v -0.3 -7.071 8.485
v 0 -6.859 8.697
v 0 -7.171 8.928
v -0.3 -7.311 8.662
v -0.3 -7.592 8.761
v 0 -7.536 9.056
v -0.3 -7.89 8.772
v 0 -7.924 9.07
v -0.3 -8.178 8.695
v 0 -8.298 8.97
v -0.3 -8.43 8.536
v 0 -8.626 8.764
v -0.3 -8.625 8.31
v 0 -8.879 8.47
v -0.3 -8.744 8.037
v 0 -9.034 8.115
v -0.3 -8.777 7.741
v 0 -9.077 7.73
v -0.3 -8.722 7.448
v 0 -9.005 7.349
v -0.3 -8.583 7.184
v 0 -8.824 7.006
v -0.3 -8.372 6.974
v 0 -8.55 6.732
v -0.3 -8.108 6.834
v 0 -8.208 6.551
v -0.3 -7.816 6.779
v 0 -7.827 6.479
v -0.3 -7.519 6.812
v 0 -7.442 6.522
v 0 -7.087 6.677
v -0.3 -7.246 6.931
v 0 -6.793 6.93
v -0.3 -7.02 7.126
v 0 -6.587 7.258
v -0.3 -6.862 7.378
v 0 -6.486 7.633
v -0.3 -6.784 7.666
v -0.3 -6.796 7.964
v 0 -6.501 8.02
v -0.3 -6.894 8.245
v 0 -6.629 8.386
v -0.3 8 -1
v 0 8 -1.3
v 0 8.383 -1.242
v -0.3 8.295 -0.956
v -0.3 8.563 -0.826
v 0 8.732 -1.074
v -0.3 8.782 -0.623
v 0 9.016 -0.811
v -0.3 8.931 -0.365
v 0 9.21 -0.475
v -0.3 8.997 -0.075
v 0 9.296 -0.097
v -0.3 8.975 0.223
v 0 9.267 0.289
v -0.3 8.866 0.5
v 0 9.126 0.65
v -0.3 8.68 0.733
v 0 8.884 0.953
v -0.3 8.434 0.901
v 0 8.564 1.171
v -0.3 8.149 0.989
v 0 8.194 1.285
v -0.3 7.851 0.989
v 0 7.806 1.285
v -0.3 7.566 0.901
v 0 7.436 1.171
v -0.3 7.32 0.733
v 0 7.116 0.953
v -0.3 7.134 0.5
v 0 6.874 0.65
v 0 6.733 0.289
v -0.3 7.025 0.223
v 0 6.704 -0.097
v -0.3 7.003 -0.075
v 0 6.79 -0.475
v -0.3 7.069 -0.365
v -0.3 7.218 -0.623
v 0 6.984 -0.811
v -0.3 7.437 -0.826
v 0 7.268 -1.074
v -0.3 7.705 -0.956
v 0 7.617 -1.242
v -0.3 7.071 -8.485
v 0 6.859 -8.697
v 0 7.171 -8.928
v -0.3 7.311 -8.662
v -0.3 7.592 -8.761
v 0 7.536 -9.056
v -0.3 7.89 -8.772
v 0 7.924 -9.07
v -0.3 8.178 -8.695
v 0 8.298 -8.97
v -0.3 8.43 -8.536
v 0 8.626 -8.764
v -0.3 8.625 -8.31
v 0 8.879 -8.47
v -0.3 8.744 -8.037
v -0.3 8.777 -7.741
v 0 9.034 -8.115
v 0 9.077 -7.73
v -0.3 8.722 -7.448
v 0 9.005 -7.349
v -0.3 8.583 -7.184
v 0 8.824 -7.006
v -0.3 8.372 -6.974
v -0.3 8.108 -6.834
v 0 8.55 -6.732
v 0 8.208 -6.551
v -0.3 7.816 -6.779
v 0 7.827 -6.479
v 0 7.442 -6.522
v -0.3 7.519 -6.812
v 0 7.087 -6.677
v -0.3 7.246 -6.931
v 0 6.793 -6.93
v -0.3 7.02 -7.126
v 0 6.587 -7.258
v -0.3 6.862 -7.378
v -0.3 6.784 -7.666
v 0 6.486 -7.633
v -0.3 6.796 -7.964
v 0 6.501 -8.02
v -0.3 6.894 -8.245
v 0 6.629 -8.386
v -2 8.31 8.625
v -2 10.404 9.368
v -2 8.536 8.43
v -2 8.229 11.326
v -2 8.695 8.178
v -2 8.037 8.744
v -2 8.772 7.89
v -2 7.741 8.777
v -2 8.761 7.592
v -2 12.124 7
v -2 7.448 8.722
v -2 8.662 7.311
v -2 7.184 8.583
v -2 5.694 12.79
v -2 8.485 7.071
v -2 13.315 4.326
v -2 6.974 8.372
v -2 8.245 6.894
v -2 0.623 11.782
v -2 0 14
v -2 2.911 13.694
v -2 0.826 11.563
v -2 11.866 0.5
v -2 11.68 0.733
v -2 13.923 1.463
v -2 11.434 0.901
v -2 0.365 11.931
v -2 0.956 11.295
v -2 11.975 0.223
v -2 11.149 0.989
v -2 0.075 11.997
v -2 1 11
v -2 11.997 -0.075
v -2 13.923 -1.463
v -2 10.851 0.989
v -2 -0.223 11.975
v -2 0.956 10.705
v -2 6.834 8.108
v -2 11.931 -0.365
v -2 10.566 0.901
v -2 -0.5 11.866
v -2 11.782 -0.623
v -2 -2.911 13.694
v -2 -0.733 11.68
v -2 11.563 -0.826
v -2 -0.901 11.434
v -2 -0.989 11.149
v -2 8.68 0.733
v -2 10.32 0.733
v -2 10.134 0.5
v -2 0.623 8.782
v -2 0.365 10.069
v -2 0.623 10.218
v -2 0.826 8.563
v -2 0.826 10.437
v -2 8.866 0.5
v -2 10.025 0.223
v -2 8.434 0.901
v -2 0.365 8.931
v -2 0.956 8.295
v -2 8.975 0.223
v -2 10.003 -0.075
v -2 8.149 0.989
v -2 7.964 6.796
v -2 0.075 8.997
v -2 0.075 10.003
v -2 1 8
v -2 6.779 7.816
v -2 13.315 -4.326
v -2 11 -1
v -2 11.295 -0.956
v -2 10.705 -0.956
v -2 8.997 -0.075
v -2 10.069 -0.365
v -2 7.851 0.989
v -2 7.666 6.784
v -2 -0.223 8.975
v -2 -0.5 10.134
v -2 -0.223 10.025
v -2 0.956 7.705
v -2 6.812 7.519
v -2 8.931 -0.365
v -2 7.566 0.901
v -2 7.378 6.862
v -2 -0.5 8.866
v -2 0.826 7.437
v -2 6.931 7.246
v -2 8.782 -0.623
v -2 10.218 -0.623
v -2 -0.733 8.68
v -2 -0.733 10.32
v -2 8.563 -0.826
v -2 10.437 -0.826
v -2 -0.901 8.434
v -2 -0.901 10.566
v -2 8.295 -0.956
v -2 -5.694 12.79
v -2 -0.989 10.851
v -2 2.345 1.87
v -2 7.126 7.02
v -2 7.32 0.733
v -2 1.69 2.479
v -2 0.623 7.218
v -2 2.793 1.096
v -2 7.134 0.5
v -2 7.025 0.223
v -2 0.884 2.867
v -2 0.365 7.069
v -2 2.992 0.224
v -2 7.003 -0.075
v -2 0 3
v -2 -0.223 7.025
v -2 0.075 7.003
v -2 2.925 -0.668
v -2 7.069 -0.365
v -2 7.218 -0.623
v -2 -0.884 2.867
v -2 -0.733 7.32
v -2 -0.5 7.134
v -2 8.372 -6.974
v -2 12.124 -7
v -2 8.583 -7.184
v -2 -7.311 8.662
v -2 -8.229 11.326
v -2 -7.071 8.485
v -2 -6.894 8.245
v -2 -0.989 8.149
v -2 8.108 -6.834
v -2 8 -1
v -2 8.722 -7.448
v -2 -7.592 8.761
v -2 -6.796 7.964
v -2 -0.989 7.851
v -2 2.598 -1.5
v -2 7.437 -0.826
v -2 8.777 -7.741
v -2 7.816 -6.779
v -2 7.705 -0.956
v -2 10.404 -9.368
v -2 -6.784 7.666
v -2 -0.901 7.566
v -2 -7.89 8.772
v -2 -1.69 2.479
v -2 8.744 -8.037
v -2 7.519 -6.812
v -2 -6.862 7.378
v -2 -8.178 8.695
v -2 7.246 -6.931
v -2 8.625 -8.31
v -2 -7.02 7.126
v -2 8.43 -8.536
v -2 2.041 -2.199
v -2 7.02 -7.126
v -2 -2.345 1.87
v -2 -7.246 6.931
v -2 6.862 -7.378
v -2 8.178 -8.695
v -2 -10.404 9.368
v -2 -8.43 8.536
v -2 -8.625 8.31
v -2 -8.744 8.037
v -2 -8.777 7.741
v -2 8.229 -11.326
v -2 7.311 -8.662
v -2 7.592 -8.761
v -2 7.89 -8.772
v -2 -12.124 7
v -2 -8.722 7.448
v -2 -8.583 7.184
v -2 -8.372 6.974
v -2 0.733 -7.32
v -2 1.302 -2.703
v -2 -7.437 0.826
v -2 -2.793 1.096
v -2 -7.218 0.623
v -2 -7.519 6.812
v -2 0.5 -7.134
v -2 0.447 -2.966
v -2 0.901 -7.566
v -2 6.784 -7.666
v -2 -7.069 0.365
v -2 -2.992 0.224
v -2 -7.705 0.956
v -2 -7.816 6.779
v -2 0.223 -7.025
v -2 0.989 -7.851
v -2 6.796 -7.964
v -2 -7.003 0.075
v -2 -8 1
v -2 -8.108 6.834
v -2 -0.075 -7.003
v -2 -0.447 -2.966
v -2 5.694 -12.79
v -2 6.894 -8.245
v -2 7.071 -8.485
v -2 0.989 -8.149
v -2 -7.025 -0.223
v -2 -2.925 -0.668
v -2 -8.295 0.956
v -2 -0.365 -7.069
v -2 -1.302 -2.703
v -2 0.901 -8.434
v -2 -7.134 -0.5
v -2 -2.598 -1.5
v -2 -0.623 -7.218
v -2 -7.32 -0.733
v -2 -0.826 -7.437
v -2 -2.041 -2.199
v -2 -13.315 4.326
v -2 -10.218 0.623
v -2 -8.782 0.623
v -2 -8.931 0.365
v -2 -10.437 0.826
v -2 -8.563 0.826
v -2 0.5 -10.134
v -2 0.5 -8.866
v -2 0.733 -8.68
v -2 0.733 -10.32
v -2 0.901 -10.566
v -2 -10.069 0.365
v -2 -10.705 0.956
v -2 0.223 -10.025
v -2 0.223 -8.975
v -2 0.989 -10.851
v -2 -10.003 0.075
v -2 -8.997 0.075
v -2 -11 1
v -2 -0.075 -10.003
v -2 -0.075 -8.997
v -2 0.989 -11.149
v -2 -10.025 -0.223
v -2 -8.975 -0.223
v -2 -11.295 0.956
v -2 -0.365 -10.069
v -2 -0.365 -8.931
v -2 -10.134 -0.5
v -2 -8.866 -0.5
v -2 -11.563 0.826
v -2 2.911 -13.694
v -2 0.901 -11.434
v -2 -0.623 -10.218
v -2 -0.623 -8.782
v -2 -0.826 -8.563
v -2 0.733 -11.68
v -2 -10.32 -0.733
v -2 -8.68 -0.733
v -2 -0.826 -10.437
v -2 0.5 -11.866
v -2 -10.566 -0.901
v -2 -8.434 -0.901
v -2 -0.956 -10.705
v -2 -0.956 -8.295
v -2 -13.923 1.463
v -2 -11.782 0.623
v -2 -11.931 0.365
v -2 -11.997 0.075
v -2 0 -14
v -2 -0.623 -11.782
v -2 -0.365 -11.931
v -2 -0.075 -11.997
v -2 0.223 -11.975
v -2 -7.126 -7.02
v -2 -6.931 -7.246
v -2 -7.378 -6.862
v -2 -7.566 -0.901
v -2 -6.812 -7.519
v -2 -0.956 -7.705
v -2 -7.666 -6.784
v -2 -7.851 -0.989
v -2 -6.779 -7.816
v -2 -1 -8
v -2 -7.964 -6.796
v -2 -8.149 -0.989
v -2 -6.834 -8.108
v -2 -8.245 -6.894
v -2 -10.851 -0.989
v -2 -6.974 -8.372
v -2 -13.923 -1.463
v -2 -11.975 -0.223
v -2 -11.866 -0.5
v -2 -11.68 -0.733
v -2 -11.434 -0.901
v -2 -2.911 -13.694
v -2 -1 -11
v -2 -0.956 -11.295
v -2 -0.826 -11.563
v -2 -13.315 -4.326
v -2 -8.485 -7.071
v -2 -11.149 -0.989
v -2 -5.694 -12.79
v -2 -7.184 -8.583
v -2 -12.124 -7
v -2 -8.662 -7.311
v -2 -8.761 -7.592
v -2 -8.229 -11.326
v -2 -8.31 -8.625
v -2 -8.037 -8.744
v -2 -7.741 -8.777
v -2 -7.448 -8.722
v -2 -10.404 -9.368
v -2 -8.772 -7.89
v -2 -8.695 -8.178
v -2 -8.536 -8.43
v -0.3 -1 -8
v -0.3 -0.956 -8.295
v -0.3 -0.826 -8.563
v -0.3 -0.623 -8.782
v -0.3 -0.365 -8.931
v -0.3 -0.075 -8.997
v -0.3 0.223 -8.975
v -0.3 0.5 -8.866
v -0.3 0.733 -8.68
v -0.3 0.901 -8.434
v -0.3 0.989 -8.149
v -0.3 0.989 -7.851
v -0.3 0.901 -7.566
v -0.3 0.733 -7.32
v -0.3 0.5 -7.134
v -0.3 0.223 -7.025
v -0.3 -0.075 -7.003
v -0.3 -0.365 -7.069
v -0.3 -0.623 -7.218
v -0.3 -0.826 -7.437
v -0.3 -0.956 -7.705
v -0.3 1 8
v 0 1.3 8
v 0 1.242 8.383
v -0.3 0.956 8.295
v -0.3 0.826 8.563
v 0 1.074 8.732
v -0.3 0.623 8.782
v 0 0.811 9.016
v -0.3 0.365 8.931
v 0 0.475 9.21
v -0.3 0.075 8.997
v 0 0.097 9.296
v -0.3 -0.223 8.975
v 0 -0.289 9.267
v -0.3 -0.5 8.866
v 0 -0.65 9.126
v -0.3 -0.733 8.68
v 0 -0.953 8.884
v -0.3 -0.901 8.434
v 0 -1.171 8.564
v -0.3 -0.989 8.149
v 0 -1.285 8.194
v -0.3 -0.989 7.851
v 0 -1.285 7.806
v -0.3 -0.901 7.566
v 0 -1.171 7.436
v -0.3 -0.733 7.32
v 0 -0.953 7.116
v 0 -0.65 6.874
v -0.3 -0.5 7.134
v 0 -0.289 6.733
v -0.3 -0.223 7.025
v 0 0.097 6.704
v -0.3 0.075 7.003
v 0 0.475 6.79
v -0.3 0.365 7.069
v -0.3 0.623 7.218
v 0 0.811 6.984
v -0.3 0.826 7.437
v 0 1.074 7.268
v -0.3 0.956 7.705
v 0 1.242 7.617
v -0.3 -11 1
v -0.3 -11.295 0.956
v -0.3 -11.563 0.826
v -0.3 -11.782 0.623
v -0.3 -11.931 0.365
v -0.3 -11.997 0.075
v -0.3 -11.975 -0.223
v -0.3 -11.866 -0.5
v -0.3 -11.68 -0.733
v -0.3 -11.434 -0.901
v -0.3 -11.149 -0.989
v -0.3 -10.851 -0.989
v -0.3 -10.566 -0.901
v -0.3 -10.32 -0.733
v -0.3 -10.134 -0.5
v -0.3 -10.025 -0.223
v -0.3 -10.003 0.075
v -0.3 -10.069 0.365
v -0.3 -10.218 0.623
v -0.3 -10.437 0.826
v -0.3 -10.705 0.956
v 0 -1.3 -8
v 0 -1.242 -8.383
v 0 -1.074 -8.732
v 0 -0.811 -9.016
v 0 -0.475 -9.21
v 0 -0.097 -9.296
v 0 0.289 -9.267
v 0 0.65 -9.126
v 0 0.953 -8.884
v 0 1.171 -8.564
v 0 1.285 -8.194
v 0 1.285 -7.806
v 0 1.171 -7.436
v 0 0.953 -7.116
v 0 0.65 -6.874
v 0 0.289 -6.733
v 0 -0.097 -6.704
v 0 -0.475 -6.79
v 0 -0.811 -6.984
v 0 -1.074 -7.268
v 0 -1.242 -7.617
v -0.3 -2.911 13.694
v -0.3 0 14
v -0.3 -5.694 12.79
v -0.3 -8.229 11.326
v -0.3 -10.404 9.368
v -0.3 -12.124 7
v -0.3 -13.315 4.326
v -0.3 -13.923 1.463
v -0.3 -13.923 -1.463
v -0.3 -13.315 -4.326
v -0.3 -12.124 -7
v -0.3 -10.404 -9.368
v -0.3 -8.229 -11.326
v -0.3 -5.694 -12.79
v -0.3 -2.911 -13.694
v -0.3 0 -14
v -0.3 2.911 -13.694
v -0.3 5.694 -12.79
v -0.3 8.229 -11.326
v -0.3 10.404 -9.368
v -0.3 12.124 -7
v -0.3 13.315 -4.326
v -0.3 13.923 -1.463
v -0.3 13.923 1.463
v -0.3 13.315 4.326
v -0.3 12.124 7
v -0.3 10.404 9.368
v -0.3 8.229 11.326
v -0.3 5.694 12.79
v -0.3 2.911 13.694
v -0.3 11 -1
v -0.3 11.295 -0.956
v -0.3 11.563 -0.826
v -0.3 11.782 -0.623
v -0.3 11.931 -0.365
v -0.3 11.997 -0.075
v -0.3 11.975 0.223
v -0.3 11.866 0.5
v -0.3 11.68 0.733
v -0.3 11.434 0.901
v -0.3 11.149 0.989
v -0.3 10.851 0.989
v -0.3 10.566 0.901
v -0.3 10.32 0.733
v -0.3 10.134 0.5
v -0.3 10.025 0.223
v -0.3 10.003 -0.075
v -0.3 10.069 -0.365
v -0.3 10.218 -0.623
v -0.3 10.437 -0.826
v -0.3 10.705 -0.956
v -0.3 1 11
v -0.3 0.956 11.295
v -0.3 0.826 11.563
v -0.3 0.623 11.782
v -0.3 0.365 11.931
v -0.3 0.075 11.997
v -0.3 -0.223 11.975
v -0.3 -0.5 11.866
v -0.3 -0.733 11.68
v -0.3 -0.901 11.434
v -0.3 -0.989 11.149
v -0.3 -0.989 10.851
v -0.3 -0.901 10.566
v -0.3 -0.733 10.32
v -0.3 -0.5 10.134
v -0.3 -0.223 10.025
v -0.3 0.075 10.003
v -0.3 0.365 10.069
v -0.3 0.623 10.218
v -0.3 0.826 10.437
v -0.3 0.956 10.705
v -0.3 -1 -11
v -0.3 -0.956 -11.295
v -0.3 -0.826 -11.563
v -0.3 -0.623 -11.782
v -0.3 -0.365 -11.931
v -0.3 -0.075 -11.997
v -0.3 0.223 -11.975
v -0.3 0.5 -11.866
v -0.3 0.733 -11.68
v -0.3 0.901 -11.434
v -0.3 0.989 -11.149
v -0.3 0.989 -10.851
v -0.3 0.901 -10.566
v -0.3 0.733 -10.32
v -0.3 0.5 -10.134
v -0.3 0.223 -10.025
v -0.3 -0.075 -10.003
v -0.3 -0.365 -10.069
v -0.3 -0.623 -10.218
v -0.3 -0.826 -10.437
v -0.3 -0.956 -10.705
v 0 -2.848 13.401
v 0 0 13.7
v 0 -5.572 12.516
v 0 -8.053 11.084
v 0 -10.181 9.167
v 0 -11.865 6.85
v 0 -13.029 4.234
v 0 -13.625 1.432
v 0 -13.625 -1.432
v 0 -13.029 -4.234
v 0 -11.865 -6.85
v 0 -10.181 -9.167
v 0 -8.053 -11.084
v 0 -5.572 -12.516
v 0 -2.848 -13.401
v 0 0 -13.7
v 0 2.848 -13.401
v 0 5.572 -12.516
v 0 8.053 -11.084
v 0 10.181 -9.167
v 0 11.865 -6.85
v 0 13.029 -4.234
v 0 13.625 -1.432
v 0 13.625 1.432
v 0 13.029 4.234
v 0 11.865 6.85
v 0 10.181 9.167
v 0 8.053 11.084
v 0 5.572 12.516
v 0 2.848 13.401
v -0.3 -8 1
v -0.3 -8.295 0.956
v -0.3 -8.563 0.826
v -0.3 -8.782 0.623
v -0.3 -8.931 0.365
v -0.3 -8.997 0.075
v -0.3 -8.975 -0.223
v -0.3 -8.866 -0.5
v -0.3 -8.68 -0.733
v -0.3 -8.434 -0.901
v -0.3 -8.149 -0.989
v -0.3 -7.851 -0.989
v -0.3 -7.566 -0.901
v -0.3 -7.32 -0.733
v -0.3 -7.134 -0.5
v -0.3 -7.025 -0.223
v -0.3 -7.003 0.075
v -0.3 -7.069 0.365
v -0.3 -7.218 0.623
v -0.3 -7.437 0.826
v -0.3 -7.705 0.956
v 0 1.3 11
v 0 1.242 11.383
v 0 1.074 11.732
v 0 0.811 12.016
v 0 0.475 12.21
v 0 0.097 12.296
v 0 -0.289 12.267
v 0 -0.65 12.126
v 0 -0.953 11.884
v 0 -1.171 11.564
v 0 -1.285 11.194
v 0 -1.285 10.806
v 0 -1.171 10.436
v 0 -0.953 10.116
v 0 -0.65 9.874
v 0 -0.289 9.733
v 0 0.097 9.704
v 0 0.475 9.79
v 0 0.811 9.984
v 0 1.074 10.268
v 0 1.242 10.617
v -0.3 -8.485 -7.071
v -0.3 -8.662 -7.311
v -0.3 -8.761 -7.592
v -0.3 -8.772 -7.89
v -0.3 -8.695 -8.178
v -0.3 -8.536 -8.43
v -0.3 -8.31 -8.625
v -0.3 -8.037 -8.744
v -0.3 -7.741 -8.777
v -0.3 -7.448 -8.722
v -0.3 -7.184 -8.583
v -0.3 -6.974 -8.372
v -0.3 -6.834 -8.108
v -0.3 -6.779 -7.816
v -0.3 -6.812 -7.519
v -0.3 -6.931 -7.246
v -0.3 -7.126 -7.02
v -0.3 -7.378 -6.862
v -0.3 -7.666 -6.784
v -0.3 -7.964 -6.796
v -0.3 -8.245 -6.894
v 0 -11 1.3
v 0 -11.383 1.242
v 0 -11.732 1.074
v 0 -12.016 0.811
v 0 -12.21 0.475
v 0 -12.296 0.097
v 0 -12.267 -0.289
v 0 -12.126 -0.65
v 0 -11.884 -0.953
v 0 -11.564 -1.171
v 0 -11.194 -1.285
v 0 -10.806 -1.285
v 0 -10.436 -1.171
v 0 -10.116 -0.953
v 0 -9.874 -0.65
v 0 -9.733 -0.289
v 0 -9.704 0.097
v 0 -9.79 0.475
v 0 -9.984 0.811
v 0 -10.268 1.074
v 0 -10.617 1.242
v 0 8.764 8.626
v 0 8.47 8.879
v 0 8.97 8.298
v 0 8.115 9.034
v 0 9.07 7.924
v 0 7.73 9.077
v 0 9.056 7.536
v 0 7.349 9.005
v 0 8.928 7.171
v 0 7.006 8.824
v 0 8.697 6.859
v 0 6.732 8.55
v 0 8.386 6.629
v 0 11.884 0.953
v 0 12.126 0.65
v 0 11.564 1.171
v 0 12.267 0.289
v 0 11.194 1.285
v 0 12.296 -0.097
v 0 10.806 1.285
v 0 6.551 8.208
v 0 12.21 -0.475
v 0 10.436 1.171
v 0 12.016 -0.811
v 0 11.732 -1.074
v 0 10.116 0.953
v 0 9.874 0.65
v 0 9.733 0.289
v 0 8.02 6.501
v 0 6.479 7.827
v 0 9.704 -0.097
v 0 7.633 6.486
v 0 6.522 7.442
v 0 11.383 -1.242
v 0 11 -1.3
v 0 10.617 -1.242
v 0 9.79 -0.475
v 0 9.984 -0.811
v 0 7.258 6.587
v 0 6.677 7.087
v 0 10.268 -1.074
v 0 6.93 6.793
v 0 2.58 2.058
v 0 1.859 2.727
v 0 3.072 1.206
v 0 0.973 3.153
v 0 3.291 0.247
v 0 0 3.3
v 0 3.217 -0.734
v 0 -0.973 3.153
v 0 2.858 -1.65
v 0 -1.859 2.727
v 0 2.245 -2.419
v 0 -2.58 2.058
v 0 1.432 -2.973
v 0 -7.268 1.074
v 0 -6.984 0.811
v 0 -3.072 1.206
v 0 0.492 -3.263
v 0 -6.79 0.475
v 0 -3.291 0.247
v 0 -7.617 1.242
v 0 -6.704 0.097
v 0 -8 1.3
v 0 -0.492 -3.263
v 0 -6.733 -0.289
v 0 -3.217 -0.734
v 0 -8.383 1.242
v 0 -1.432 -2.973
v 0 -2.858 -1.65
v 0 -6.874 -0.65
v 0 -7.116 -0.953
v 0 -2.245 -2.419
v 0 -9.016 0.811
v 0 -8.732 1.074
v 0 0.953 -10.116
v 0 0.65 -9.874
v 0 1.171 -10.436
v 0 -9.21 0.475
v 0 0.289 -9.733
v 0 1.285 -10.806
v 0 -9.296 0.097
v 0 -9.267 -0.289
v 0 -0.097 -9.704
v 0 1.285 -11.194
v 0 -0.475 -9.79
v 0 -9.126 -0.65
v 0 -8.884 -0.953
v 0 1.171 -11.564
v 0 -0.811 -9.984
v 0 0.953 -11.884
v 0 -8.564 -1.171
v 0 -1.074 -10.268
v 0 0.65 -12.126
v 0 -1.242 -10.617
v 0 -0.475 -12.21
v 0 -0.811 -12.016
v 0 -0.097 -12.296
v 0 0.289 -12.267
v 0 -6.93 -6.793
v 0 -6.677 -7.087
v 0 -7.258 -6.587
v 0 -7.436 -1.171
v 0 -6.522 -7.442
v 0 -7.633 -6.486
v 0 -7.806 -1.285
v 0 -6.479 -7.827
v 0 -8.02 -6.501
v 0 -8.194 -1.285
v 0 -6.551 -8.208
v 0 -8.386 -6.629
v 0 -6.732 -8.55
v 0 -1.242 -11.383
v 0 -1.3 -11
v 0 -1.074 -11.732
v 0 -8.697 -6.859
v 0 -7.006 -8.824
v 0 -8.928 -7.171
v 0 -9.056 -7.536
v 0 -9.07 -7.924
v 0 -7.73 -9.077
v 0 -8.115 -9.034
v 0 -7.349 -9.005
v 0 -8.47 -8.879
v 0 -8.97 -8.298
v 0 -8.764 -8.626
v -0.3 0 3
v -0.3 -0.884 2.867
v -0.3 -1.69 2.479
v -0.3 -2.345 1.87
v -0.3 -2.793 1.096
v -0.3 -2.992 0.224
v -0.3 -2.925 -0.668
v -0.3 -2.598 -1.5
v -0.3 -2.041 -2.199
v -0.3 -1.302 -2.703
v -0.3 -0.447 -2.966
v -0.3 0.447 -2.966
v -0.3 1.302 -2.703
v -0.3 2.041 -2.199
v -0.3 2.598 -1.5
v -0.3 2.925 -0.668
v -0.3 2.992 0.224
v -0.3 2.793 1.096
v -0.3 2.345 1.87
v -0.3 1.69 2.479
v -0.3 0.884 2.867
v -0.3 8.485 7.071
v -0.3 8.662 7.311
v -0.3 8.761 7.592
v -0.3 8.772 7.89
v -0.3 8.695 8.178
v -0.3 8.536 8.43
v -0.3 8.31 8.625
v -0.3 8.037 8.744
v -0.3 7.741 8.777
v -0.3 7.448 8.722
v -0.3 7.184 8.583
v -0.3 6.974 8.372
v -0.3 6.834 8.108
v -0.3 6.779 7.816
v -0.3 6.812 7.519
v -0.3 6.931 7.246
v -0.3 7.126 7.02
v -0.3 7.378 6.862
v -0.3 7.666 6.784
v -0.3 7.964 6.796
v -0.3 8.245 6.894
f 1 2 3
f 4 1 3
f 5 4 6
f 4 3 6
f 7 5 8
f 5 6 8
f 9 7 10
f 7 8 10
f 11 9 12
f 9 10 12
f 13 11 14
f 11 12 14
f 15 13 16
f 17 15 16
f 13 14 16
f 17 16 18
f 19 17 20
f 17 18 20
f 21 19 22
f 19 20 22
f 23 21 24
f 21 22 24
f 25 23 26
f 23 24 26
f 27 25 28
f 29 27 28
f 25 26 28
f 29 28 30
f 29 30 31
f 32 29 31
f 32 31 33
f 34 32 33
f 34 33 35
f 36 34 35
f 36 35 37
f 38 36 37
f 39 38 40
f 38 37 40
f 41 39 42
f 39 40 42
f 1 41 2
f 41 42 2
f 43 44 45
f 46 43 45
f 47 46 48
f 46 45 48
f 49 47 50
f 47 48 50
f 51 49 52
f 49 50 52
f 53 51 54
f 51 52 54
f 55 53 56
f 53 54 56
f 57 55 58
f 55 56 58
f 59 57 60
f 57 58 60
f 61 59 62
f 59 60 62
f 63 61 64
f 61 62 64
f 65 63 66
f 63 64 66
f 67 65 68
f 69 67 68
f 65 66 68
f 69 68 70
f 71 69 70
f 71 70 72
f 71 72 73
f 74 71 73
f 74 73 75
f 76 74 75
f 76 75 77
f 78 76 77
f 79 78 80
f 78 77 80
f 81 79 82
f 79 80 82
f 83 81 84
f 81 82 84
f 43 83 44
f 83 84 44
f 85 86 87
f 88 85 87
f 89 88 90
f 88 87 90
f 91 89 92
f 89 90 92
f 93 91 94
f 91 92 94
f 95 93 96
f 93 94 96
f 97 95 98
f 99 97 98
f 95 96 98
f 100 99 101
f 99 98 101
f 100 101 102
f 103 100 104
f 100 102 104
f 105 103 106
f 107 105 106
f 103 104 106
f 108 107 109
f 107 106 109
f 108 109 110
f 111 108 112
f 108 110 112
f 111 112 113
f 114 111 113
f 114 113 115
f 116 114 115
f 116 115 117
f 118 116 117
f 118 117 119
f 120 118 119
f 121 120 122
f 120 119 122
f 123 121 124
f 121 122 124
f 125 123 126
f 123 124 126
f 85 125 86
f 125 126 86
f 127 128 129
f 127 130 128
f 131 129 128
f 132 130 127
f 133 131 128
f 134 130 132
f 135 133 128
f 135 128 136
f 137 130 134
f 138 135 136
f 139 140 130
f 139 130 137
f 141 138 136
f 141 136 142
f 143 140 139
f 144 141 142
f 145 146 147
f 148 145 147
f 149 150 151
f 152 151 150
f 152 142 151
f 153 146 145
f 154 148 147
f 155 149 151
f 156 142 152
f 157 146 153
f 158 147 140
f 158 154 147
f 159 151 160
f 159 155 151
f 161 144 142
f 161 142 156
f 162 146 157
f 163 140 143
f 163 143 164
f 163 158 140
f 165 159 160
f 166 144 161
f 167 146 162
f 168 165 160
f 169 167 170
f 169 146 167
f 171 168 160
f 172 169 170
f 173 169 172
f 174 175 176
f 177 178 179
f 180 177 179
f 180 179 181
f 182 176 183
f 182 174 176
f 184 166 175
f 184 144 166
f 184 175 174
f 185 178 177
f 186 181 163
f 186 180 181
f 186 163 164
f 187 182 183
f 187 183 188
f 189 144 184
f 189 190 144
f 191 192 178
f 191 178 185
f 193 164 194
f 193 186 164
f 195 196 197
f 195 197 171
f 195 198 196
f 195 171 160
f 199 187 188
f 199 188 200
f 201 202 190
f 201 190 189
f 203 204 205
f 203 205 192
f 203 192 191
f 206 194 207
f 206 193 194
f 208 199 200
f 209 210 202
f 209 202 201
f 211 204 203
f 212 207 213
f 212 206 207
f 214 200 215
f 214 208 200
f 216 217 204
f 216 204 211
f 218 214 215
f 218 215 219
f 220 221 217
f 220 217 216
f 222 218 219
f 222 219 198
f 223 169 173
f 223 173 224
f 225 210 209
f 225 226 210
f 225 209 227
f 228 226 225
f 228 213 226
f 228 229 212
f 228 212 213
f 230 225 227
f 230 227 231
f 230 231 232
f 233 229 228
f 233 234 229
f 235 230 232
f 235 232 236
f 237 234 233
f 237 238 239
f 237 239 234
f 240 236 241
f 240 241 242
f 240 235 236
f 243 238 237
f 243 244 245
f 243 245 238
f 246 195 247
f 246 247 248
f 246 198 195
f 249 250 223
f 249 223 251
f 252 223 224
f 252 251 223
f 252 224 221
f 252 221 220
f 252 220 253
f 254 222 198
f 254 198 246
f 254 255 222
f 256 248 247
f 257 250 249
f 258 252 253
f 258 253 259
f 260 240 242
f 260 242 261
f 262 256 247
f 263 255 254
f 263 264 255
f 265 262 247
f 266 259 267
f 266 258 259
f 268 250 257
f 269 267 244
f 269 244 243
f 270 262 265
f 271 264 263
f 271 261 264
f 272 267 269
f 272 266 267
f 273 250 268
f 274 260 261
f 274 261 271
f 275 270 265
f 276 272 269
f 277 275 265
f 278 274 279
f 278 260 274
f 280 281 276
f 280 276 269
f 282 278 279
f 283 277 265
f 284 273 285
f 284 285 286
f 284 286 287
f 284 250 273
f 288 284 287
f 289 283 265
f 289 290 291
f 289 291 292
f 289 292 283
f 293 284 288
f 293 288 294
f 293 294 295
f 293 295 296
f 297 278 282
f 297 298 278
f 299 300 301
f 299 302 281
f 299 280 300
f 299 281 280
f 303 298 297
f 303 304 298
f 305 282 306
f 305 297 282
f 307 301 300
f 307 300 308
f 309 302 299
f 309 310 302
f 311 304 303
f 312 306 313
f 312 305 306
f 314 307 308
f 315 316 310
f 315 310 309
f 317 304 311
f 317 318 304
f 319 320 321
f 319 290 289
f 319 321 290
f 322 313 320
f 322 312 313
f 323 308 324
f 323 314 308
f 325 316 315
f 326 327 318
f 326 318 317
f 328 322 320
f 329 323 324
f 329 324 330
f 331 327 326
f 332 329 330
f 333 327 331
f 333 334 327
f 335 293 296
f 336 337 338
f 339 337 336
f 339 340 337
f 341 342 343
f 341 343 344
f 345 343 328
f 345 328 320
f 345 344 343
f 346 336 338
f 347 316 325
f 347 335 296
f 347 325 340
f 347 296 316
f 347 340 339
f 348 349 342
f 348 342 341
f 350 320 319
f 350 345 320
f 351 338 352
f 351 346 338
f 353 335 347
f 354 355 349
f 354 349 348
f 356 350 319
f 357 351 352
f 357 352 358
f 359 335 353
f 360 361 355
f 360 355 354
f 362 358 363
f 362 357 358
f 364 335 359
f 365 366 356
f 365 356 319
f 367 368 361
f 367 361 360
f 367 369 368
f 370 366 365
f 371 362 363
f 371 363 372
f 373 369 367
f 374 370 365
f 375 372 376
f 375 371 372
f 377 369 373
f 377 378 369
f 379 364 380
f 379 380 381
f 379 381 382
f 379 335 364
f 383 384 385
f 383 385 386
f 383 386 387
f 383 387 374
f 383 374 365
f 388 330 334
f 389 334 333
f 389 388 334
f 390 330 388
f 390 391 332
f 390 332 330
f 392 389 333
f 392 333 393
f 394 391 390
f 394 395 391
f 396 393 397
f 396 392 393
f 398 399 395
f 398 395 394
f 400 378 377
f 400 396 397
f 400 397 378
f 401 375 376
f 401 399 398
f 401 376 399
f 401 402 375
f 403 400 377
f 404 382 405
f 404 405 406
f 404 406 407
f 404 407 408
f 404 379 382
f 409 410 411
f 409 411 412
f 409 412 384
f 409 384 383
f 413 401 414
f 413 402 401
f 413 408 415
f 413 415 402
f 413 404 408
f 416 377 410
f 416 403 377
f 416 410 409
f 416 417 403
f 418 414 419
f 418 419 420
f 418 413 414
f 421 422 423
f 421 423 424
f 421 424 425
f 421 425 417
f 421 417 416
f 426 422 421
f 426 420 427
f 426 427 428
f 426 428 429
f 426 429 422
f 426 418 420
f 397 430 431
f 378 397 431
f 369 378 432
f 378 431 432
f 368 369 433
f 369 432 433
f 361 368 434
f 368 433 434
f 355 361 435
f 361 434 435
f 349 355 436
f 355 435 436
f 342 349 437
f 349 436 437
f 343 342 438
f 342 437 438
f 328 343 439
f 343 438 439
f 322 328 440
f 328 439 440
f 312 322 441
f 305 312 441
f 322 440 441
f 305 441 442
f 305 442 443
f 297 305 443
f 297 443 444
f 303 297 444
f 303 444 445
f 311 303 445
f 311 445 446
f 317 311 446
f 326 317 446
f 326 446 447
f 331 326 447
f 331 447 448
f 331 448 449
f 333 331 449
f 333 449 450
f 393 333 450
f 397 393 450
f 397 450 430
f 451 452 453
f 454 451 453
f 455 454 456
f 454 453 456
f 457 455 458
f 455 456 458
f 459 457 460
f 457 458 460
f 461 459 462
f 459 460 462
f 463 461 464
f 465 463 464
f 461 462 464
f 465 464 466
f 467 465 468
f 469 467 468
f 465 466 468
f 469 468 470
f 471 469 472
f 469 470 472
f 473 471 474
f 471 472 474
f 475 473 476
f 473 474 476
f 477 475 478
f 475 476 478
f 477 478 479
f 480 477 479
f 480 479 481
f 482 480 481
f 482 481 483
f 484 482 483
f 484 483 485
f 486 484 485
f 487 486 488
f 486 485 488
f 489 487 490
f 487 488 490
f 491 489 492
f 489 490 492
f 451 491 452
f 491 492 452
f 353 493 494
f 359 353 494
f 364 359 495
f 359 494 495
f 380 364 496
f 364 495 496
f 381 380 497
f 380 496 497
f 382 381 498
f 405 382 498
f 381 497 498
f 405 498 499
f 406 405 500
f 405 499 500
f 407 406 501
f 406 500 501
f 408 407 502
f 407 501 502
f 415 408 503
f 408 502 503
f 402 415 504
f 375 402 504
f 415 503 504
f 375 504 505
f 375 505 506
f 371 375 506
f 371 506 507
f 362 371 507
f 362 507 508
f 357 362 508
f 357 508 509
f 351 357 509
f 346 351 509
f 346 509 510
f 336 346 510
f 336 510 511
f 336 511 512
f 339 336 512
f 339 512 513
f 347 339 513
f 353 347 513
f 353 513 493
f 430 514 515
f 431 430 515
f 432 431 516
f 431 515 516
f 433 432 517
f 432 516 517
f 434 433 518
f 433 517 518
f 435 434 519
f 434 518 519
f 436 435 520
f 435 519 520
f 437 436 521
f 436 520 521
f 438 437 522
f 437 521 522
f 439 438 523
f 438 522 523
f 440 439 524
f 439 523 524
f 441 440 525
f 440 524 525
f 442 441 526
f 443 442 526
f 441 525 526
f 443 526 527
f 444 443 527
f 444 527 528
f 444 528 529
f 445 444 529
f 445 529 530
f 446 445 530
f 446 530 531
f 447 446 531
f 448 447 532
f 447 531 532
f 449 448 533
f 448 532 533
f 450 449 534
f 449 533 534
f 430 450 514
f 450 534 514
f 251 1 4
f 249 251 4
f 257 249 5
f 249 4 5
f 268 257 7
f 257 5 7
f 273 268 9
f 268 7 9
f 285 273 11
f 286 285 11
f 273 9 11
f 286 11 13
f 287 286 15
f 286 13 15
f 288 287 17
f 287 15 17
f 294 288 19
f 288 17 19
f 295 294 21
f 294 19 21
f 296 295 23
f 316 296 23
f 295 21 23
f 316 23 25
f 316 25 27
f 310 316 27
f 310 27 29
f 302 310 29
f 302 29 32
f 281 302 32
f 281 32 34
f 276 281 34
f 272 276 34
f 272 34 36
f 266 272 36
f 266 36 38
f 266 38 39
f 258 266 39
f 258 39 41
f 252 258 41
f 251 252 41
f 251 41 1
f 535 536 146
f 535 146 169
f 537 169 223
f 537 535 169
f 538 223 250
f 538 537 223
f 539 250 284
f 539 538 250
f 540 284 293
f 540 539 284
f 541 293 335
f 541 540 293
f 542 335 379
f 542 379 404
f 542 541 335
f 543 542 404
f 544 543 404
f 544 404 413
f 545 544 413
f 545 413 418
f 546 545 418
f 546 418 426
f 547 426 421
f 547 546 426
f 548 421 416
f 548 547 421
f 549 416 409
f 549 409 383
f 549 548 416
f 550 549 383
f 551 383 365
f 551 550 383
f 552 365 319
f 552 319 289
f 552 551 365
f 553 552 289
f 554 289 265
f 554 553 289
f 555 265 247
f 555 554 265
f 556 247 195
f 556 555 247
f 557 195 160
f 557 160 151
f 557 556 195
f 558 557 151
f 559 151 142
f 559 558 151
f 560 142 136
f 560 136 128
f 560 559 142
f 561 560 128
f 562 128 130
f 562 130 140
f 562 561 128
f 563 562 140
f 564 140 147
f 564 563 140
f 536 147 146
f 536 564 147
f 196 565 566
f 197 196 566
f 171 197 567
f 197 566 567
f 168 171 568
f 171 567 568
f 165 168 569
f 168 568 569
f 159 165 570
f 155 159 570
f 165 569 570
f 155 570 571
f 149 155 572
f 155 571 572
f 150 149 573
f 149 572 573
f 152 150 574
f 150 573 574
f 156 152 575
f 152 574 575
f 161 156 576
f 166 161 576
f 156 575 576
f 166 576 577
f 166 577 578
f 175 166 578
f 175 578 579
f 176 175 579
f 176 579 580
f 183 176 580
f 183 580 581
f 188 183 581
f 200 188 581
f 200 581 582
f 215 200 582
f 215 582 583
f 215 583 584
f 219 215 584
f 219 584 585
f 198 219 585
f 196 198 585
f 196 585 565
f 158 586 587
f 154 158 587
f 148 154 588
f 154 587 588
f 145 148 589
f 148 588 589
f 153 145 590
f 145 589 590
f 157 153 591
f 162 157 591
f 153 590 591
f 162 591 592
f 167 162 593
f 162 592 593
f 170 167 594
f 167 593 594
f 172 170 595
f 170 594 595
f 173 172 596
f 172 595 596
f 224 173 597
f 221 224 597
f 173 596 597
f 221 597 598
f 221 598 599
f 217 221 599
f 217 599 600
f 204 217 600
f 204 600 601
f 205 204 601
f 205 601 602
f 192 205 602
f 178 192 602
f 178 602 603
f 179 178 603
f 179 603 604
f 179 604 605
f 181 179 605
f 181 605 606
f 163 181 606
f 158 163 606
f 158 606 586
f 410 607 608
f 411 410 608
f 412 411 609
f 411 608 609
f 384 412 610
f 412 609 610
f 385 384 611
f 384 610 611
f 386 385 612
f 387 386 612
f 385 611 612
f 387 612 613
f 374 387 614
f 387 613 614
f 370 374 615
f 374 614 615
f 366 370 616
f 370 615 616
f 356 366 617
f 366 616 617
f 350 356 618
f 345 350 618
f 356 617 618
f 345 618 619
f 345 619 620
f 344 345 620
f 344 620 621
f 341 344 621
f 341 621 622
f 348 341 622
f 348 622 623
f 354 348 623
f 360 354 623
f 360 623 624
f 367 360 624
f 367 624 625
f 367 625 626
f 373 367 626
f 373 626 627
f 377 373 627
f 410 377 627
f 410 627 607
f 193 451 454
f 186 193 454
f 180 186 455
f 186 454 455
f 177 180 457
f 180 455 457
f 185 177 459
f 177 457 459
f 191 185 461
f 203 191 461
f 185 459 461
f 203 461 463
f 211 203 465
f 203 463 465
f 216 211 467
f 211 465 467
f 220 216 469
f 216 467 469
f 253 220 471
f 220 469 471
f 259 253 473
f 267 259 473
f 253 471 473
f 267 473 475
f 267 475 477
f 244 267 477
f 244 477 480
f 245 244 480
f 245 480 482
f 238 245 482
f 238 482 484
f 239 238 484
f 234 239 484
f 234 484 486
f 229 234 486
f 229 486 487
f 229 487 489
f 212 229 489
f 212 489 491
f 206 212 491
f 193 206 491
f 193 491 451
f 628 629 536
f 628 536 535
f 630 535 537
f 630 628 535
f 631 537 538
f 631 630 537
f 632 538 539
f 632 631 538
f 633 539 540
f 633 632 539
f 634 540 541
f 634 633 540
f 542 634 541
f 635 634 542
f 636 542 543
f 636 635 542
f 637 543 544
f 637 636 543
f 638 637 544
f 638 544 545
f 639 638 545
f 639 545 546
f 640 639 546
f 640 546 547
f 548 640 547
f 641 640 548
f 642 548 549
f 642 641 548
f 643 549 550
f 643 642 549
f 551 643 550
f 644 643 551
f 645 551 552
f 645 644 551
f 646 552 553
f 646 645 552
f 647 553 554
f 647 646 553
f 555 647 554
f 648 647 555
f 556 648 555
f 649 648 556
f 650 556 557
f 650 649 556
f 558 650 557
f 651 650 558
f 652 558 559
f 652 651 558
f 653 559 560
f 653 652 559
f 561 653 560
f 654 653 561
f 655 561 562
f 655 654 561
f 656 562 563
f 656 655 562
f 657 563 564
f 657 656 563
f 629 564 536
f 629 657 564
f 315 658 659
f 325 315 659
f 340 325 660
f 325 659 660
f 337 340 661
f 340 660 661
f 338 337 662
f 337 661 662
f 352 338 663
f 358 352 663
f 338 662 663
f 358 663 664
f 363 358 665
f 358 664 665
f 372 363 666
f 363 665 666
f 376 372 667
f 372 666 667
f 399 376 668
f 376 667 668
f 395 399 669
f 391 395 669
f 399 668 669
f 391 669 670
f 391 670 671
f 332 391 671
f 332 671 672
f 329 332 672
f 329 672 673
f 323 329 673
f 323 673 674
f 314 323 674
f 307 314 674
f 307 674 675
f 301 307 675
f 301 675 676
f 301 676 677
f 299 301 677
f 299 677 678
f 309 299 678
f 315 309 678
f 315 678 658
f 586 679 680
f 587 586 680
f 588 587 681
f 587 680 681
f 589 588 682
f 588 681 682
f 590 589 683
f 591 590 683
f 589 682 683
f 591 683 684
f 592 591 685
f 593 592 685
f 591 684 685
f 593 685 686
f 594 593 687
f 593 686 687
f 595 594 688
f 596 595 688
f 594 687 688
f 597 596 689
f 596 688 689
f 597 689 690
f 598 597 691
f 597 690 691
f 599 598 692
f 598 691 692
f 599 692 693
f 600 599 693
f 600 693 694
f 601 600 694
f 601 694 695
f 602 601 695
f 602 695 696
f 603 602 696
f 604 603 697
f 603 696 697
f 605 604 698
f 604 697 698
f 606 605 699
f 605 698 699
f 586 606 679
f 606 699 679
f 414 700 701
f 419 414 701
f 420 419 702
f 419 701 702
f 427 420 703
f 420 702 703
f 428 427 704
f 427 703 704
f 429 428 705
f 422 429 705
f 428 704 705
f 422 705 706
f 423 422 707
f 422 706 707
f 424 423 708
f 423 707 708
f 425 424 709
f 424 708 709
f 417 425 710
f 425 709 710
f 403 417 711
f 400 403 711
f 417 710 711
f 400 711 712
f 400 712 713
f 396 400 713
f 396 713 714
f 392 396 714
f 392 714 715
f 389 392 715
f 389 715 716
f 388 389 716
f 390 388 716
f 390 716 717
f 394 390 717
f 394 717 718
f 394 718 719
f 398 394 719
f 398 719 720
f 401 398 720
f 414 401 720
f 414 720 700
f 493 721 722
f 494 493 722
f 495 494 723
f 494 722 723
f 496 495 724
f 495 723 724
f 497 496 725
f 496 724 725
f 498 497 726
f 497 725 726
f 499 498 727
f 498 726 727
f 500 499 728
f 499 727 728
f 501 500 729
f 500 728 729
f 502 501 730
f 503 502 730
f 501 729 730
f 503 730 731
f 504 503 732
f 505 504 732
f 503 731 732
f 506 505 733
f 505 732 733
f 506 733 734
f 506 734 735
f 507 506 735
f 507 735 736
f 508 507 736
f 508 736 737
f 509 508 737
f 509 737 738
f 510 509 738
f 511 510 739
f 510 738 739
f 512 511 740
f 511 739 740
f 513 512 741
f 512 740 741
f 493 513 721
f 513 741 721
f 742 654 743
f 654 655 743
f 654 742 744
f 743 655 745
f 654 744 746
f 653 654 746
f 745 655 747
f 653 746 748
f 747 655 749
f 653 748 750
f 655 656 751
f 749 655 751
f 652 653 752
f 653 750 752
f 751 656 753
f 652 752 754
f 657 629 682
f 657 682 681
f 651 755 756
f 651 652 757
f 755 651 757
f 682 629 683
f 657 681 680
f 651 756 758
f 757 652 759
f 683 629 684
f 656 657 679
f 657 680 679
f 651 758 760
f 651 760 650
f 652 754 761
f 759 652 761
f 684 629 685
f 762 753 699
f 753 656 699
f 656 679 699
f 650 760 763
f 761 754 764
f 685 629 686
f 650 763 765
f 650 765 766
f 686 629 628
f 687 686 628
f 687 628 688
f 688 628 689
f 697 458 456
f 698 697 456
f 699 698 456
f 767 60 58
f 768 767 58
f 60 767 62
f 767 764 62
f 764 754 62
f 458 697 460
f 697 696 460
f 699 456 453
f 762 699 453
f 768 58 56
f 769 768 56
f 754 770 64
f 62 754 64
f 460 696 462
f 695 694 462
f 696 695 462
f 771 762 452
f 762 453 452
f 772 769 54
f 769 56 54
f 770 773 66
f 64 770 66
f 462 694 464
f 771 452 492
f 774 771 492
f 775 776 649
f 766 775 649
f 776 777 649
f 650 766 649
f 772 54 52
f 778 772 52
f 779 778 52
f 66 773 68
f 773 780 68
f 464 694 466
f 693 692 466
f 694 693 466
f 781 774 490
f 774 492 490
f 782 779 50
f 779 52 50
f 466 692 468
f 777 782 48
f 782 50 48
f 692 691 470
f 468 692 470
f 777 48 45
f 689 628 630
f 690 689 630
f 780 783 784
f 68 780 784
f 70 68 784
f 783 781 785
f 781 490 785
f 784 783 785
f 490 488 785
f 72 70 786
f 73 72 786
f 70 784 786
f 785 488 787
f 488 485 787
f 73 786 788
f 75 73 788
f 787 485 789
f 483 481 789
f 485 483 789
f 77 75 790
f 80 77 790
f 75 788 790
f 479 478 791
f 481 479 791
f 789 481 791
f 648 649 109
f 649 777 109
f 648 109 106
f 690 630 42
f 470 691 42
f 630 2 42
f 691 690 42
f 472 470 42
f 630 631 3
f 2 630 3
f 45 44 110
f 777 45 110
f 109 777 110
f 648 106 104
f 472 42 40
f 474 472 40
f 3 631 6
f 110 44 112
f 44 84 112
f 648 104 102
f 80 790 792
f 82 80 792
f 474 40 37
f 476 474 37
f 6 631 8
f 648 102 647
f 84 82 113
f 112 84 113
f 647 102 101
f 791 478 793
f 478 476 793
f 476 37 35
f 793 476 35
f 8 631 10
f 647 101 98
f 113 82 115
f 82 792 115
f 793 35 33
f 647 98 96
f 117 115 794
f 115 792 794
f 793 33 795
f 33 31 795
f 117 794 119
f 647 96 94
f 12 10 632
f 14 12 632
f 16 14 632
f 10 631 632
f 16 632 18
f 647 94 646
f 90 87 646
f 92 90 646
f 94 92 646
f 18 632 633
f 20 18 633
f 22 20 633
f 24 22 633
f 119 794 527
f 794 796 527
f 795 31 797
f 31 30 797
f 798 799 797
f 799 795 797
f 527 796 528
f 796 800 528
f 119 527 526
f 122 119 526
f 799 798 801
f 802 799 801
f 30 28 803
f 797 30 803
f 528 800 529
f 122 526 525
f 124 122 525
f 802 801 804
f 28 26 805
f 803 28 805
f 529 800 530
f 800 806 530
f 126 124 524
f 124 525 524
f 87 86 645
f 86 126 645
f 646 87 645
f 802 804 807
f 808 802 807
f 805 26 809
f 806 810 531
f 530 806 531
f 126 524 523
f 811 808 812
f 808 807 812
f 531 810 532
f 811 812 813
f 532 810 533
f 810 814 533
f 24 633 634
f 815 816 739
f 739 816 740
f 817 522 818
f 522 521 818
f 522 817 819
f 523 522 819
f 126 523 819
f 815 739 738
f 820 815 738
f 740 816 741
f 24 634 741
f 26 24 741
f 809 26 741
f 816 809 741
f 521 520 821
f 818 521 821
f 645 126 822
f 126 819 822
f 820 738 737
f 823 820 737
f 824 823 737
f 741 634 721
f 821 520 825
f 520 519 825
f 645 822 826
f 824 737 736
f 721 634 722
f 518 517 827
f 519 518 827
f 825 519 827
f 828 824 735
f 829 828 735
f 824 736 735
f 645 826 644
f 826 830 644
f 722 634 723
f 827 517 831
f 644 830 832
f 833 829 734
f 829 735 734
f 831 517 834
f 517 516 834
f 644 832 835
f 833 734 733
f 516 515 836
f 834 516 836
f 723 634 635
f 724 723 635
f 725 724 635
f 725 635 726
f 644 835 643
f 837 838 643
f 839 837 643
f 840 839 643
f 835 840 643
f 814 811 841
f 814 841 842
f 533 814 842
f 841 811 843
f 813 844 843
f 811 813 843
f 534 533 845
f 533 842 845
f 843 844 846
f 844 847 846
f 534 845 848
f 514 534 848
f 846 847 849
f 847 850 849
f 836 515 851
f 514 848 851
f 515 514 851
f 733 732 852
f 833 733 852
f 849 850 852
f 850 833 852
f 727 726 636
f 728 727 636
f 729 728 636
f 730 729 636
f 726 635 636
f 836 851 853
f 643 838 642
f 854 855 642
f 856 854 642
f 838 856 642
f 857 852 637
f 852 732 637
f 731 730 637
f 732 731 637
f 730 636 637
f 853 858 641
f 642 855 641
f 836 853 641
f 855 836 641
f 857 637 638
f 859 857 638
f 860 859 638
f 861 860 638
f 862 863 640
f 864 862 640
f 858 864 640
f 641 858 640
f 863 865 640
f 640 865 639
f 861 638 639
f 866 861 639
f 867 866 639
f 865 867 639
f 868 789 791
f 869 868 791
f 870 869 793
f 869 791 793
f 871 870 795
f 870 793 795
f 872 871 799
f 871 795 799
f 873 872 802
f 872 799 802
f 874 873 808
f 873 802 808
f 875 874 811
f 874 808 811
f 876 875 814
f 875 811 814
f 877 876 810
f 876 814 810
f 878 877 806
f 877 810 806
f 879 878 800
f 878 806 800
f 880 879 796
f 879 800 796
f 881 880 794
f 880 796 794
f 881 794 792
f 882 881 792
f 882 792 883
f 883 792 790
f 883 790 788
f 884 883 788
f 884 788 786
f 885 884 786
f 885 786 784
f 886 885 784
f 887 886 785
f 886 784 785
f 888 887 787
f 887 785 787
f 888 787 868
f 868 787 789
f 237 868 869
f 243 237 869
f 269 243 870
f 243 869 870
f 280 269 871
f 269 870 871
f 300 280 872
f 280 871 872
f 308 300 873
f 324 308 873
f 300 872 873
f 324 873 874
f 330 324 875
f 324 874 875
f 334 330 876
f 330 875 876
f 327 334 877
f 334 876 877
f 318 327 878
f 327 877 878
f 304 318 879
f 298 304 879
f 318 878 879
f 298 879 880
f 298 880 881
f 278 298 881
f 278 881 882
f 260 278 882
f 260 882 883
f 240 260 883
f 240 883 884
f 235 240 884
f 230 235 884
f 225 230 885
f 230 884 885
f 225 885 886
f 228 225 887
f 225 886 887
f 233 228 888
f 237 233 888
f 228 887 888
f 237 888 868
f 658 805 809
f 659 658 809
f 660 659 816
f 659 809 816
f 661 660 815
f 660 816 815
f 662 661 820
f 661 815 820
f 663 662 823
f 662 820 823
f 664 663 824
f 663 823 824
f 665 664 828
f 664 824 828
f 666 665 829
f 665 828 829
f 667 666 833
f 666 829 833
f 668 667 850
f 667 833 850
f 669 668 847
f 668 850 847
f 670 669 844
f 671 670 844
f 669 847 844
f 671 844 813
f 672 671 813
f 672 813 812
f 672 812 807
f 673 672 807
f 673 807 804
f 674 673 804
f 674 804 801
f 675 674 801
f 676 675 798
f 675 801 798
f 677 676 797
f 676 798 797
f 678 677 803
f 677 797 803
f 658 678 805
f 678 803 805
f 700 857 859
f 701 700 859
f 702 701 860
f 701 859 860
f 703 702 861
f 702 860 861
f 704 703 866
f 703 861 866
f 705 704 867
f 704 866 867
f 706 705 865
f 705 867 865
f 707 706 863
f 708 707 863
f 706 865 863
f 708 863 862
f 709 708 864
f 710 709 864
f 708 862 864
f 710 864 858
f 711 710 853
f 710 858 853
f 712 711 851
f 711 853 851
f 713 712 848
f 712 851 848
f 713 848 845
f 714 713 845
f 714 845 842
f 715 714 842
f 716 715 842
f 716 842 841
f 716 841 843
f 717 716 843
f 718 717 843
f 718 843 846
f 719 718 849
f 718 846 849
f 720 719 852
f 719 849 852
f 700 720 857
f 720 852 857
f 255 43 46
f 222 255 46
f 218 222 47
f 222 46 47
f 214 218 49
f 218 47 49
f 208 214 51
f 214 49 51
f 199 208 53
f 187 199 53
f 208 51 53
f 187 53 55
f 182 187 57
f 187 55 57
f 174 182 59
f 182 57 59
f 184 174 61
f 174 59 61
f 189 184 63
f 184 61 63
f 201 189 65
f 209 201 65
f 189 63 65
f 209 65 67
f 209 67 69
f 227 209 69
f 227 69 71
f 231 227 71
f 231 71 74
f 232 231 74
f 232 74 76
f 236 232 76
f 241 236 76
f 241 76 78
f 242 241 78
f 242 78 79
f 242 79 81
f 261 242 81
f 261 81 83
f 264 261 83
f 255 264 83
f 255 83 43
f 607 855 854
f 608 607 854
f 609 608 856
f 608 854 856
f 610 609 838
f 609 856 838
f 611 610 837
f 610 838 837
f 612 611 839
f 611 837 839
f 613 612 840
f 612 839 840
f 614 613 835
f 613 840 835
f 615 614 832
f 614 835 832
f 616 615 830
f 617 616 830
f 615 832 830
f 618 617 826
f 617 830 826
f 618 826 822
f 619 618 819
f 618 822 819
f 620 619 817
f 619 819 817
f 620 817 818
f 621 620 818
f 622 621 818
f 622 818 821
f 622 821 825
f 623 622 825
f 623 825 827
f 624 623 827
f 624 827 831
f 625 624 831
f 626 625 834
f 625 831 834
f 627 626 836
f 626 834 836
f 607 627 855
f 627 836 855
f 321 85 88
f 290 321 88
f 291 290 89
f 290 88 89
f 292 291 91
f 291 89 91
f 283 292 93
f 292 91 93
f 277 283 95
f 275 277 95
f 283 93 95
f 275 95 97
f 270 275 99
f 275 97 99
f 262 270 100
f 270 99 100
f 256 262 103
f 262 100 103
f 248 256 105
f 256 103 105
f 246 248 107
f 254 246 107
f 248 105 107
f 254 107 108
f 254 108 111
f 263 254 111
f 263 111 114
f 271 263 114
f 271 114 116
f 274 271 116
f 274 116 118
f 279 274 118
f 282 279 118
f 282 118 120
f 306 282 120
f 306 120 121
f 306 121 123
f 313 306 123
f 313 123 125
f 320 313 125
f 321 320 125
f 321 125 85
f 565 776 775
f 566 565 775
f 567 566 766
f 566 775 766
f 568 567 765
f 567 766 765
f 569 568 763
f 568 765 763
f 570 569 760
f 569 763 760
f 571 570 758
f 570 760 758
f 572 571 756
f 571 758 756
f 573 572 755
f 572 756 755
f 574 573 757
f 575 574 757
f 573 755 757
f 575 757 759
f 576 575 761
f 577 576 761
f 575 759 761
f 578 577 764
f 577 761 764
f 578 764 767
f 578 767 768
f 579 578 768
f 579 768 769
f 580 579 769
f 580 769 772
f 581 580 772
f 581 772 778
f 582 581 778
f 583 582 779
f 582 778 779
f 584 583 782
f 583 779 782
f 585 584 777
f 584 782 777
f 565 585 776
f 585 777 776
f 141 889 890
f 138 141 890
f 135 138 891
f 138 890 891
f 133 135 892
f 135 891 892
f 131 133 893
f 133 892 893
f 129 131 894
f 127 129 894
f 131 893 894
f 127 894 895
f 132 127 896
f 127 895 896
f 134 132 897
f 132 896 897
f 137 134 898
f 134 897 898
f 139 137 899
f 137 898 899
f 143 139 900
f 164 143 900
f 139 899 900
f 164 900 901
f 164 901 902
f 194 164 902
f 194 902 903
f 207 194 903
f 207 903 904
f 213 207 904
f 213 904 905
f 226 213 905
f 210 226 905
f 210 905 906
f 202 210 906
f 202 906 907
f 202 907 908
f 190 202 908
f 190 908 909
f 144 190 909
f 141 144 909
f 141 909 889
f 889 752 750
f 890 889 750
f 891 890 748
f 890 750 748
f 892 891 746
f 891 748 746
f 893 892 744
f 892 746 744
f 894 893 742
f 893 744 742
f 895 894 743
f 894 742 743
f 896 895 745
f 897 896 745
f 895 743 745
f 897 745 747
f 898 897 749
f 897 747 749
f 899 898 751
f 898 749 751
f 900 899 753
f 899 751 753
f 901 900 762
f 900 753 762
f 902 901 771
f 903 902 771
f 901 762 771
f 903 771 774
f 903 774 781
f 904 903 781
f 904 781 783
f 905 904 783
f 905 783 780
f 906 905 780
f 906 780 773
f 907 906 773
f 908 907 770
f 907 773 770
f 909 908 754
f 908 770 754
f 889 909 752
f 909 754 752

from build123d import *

# Parameters (mm, degrees)
SKETCH1_W          = 2
SKETCH1_H          = 11
SKETCH2_R          = 1
CUT_EXTRUDE1_DEPTH = 20.899748742
CIRPATTERN2_COUNT  = 8
SKETCH3_R          = 1
CUT_EXTRUDE2_DEPTH = 20.899748742
CIRPATTERN3_COUNT  = 4
CHAMFER1_SIZE      = 0.3


with BuildPart() as part:
    # Sketch1 → Revolve1 (revolve)
    with BuildSketch(Plane.XY, mode=Mode.PRIVATE) as revolve1_sk:
        with Locations((-1, 8.5)):
            Rectangle(SKETCH1_W, SKETCH1_H)
    revolve(revolve1_sk.sketch.rotate(Axis((0, 0, 0), (1, 0, 0)), 90), axis=Axis((0, 0, 0), (1, 0, 0)))

    # Sketch2 → Cut-Extrude1 (cut, through all)
    with BuildSketch(Plane(origin=(0, 0, 0), x_dir=(0, 0, -1), z_dir=(1, 0, 0))):
        with Locations((0, 11)):
            Circle(SKETCH2_R)
    cut_extrude1 = extrude(amount=-CUT_EXTRUDE1_DEPTH, mode=Mode.SUBTRACT)

    # CirPattern2: Cut-Extrude1 ×8 about axis
    cirpattern2_axis = Axis((0, 0, 0), (1, 0, 0))
    for i in range(1, CIRPATTERN2_COUNT):
        add(cut_extrude1.rotate(cirpattern2_axis, i * 360 / CIRPATTERN2_COUNT), mode=Mode.SUBTRACT)

    # Sketch3 → Cut-Extrude2 (cut, through all)
    with BuildSketch(Plane(origin=(0, 0, 0), x_dir=(0, 0, -1), z_dir=(1, 0, 0))):
        with Locations((0, 8)):
            Circle(SKETCH3_R)
    cut_extrude2 = extrude(amount=-CUT_EXTRUDE2_DEPTH, mode=Mode.SUBTRACT)

    # CirPattern3: Cut-Extrude2 ×4 about axis
    cirpattern3_axis = Axis((0, 0, 0), (1, 0, 0))
    for i in range(1, CIRPATTERN3_COUNT):
        add(cut_extrude2.rotate(cirpattern3_axis, i * 360 / CIRPATTERN3_COUNT), mode=Mode.SUBTRACT)

    # Chamfer1
    chamfer1_edges = [part.edges().sort_by_distance(p)[0] for p in [
        (0, 11, 1),
        (0, 8.485281374, -7.071067812),
        (0, 1, -11),
        (0, -7.071067812, -8.485281374),
        (0, -11, -1),
        (0, -8.485281374, 7.071067812),
        (0, -1, 11),
        (0, 0, -3),
        (0, 7.071067812, 8.485281374),
        (0, 0, -14),
        (0, 8, 1),
        (0, 1, -8),
        (0, -8, -1),
        (0, -1, 8),
    ]]
    chamfer(chamfer1_edges, length=CHAMFER1_SIZE)


solid = part.part
